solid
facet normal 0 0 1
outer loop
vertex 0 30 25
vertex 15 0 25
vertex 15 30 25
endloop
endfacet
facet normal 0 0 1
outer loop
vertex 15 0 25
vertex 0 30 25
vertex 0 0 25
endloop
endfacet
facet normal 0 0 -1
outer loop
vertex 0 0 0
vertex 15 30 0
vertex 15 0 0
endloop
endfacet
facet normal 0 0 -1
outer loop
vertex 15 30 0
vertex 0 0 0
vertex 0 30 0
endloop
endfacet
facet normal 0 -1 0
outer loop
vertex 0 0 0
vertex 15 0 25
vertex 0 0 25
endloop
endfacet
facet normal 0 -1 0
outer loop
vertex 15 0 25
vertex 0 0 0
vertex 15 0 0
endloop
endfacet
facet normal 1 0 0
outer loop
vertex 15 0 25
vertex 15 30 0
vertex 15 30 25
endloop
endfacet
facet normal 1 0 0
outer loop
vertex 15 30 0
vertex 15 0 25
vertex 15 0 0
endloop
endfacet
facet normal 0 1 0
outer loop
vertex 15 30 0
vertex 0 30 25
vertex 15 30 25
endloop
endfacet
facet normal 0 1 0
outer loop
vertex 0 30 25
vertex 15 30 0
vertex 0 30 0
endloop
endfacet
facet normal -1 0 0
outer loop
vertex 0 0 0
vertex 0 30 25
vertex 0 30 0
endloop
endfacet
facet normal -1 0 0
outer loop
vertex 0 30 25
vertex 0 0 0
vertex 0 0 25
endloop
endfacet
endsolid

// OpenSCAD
// Generated by generate_scads.py
union() {
  cube(size=[15,30,25], center=false);
}
